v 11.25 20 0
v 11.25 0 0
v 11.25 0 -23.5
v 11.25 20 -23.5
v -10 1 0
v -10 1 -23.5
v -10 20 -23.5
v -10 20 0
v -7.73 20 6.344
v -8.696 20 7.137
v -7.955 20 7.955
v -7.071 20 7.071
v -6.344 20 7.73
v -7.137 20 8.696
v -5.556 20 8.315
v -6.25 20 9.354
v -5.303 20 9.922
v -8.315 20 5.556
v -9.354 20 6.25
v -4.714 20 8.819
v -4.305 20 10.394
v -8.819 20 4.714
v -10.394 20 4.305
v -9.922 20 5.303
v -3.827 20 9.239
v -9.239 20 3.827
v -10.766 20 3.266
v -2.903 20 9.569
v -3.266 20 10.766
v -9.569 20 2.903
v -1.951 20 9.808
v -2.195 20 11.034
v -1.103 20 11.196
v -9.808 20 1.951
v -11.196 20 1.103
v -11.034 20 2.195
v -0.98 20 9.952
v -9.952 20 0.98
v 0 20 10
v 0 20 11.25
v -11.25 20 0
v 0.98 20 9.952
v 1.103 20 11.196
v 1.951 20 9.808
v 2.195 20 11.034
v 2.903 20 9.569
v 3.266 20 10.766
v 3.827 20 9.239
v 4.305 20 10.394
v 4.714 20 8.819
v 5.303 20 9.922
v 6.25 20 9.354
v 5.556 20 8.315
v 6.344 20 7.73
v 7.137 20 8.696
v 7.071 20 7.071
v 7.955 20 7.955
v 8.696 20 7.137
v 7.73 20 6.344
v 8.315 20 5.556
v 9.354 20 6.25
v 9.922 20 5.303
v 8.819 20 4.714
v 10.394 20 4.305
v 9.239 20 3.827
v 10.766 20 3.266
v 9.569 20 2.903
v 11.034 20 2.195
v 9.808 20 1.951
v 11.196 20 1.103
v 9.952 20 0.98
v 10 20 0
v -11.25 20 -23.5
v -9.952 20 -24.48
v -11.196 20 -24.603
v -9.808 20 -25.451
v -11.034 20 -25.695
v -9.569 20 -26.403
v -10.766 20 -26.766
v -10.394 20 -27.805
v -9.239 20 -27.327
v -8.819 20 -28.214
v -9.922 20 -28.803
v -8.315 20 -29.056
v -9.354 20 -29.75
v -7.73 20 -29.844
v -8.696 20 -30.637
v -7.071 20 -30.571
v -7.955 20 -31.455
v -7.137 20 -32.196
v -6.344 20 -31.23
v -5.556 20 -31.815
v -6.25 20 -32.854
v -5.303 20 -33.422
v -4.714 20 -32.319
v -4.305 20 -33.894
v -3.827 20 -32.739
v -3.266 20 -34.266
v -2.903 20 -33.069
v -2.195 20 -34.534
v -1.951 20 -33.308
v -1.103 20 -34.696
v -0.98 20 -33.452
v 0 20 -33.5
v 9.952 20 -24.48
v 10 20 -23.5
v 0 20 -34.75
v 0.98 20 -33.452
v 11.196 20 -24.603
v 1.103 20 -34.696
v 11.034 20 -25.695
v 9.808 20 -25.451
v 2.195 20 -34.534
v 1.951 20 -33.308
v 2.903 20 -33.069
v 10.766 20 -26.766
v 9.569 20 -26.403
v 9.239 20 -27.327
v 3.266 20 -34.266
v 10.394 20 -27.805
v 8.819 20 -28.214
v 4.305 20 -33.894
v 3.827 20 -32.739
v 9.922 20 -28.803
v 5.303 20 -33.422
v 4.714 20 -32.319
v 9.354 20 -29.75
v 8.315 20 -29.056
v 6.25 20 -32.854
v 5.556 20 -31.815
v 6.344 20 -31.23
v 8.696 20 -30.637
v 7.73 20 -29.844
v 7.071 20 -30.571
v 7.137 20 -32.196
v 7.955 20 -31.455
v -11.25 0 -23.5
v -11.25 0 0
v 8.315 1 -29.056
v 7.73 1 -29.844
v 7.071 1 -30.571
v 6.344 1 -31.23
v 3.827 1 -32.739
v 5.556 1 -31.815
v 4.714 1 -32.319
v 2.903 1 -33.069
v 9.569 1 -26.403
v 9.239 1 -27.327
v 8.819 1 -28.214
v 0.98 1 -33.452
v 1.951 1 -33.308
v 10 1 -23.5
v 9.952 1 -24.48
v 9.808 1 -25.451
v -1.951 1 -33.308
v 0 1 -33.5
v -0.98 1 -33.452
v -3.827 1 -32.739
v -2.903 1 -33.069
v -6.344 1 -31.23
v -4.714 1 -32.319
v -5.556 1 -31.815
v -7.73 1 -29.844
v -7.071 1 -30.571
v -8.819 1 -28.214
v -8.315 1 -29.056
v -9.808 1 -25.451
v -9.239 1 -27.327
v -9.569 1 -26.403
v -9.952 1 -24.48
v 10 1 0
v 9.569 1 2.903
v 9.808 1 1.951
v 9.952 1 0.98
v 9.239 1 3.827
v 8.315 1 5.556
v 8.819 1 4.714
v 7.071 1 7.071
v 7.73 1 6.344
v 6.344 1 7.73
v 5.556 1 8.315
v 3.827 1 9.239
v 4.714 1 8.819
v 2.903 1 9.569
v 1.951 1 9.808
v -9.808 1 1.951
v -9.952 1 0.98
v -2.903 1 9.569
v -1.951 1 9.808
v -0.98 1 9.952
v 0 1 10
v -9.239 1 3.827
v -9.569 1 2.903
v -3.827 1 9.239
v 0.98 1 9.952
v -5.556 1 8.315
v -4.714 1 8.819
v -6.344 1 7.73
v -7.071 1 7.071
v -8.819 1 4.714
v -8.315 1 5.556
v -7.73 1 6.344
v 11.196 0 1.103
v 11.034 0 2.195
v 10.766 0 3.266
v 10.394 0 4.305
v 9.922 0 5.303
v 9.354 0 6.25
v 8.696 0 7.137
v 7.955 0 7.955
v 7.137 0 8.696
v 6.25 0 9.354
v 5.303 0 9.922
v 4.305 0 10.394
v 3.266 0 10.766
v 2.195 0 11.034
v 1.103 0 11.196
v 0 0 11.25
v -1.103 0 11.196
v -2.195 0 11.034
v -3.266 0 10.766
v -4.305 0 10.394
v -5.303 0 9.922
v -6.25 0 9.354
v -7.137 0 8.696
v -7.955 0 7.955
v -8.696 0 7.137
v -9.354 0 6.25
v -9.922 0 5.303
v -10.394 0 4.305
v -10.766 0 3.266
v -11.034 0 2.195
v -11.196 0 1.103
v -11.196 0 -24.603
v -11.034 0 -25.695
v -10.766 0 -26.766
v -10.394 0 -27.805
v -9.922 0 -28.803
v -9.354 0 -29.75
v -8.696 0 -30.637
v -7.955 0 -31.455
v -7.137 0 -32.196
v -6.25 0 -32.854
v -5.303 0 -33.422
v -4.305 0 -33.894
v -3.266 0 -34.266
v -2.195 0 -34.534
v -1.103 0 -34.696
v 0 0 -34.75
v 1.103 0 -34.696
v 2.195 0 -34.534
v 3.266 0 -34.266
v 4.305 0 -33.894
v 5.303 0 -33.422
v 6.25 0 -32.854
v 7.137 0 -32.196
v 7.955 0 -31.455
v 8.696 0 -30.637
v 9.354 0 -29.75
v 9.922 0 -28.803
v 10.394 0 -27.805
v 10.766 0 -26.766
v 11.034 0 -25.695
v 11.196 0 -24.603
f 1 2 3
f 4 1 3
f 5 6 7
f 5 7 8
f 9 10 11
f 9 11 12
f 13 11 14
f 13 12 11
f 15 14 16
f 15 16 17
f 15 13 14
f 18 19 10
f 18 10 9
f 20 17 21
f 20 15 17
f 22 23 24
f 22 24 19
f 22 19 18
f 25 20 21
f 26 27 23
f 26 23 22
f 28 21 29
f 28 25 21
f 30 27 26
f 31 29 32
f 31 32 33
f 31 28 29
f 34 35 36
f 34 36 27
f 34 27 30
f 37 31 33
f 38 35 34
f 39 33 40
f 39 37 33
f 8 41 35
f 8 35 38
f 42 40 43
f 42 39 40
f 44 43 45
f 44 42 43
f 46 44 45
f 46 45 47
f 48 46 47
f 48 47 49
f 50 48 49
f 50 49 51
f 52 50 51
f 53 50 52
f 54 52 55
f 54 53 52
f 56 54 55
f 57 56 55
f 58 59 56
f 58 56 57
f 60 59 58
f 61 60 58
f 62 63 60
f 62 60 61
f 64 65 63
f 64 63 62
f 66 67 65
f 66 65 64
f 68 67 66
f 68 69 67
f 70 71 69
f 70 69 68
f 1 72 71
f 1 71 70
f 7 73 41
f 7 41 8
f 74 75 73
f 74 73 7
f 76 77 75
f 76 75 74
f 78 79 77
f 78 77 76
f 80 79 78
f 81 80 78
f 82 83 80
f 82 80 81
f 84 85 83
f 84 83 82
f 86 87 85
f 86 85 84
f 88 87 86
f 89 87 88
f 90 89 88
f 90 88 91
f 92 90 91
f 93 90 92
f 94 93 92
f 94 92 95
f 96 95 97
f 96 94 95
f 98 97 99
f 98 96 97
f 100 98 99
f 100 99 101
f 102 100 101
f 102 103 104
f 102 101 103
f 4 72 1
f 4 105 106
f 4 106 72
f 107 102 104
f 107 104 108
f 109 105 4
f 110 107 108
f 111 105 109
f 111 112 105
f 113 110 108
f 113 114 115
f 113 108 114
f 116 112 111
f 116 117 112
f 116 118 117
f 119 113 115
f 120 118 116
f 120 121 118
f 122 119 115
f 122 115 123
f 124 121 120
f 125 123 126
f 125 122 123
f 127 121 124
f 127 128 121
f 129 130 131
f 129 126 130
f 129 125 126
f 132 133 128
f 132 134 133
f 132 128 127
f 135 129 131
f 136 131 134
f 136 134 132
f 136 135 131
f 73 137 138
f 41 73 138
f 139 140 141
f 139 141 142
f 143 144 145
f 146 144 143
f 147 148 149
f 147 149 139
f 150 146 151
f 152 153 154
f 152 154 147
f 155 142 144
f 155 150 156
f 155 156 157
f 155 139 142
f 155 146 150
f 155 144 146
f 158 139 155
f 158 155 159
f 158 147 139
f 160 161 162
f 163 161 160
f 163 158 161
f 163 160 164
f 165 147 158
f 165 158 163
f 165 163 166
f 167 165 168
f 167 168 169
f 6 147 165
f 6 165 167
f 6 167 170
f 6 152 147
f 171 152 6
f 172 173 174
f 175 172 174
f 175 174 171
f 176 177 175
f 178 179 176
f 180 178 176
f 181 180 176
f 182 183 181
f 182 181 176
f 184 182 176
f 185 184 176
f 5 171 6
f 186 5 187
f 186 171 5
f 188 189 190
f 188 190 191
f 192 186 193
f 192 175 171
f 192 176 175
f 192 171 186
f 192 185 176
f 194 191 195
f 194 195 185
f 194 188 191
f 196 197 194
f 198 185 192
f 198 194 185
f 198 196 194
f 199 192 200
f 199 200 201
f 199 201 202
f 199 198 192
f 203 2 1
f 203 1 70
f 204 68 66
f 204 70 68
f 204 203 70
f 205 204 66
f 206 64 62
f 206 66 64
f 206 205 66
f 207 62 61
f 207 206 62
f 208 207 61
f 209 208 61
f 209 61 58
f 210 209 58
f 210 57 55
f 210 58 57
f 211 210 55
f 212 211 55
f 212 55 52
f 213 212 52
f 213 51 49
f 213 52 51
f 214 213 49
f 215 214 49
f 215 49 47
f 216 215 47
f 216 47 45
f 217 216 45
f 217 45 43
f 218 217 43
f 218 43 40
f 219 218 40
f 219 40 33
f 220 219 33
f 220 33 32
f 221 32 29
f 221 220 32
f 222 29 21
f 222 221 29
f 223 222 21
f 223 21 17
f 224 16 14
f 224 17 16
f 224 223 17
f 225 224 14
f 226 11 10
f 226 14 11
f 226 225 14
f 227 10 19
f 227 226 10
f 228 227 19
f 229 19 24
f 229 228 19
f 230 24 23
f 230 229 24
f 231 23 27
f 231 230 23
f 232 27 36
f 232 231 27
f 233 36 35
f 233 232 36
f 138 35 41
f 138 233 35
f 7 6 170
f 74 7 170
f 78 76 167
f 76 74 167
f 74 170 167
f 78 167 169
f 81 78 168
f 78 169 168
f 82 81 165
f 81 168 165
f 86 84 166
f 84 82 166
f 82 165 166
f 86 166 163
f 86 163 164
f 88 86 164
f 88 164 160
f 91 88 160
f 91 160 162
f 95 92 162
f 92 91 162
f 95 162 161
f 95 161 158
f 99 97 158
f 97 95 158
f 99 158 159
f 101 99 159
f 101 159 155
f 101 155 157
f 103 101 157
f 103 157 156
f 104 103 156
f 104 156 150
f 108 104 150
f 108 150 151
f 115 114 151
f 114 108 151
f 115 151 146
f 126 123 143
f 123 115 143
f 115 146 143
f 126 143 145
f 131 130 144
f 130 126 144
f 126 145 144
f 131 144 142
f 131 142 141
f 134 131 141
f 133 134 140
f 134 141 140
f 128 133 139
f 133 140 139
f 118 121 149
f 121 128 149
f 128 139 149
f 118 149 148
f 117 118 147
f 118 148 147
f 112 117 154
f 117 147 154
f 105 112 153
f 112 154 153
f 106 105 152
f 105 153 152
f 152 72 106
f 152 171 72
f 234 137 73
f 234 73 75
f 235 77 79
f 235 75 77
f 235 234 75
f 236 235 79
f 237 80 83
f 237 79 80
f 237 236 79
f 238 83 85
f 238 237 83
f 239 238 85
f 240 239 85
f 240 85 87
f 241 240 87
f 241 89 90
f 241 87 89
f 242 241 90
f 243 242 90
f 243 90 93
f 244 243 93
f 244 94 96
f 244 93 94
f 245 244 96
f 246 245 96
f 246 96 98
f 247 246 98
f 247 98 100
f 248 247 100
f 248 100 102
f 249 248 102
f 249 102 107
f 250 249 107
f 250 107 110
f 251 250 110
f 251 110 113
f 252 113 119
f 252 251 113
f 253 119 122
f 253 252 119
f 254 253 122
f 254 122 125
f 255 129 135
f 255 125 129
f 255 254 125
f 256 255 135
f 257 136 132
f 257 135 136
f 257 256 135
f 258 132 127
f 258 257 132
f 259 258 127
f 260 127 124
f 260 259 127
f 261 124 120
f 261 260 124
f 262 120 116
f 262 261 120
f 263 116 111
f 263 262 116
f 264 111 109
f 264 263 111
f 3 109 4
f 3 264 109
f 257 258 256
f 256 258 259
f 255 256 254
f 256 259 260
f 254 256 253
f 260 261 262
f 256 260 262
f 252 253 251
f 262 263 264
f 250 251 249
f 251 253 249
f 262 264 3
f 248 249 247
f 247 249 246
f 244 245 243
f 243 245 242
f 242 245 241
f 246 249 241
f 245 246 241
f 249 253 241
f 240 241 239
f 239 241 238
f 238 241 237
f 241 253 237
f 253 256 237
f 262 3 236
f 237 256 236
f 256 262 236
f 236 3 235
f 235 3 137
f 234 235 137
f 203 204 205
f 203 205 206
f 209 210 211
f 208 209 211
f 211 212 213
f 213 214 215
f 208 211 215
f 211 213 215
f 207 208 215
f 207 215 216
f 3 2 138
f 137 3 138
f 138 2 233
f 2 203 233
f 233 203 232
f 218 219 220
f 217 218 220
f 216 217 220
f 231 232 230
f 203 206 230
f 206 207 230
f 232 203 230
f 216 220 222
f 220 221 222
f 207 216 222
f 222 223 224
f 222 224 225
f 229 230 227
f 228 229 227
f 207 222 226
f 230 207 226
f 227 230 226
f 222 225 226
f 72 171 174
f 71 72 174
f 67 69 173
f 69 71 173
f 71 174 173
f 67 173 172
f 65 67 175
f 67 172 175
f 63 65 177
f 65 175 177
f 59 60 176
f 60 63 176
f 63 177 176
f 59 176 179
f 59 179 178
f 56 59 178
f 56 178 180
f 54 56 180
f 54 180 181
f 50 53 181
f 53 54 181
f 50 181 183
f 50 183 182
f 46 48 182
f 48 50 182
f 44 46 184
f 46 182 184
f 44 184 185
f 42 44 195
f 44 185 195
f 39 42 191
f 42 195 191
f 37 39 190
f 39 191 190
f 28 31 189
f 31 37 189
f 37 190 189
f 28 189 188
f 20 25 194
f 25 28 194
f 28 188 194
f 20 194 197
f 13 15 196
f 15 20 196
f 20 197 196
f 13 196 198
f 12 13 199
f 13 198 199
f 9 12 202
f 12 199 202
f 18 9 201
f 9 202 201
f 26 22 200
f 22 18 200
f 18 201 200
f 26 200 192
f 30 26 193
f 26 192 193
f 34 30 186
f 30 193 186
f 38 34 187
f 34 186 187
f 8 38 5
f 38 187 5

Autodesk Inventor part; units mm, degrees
ref_plane "YZ Plane" through (0, 0, 0) normal (1, 0, 0) x (0, 1, 0)
ref_plane "XZ Plane" through (0, 0, 0) normal (0, 1, 0) x (-1, 0, 0)
ref_plane "XY Plane" through (0, 0, 0) normal (0, 0, 1) x (1, 0, 0)
sketch "Sketch1" plane through (0, 0, 0) normal (0, 1, 0) x (-1, 0, 0)
  line L0 (0, 0) -> (0, -23.5) construction
  line L1 (-11.25, 0) -> (-11.25, -23.5)
  line L2 (11.25, -23.5) -> (11.25, 0)
  arc A0 (11.25, 0) -> (-11.25, 0) centre (0, 0) ccw
  arc A1 (-11.25, -23.5) -> (11.25, -23.5) centre (0, -23.5) ccw
  point P0 (0, -11.75)
  dimension "d0" = 23.5
  dimension "d1" = 22.5
extrude "Extrusion1" add sketch "Sketch1" along normal blind 1
sketch "Sketch2" plane through (0, 1, 0) normal (0, 1, 0) x (1, 0, 0)
  arc A0 (11.25, 23.5) -> (-11.25, 23.5) centre (0, 23.5) ccw projected
  line L0 (0, 0) -> (0, 23.5) construction
  line L1 (11.25, 0) -> (11.25, 23.5)
  line L2 (-11.25, 23.5) -> (-11.25, 0)
  arc A1 (-11.25, 0) -> (11.25, 0) centre (0, 0) ccw
  arc A2 (11.25, 23.5) -> (-11.25, 23.5) centre (0, 23.5) ccw
  line L3 (0, 0) -> (0, 23.5) construction
  line L4 (10, 0) -> (10, 23.5)
  line L5 (-10, 23.5) -> (-10, 0)
  arc A3 (-10, 0) -> (10, 0) centre (0, 0) ccw
  arc A4 (10, 23.5) -> (-10, 23.5) centre (0, 23.5) ccw
  point P0 (0, 11.75)
  point P1 (0, 11.75)
  dimension "d4" = 20
extrude "Extrusion2" add sketch "Sketch2" along normal blind 19
properties part number "Dopje"
